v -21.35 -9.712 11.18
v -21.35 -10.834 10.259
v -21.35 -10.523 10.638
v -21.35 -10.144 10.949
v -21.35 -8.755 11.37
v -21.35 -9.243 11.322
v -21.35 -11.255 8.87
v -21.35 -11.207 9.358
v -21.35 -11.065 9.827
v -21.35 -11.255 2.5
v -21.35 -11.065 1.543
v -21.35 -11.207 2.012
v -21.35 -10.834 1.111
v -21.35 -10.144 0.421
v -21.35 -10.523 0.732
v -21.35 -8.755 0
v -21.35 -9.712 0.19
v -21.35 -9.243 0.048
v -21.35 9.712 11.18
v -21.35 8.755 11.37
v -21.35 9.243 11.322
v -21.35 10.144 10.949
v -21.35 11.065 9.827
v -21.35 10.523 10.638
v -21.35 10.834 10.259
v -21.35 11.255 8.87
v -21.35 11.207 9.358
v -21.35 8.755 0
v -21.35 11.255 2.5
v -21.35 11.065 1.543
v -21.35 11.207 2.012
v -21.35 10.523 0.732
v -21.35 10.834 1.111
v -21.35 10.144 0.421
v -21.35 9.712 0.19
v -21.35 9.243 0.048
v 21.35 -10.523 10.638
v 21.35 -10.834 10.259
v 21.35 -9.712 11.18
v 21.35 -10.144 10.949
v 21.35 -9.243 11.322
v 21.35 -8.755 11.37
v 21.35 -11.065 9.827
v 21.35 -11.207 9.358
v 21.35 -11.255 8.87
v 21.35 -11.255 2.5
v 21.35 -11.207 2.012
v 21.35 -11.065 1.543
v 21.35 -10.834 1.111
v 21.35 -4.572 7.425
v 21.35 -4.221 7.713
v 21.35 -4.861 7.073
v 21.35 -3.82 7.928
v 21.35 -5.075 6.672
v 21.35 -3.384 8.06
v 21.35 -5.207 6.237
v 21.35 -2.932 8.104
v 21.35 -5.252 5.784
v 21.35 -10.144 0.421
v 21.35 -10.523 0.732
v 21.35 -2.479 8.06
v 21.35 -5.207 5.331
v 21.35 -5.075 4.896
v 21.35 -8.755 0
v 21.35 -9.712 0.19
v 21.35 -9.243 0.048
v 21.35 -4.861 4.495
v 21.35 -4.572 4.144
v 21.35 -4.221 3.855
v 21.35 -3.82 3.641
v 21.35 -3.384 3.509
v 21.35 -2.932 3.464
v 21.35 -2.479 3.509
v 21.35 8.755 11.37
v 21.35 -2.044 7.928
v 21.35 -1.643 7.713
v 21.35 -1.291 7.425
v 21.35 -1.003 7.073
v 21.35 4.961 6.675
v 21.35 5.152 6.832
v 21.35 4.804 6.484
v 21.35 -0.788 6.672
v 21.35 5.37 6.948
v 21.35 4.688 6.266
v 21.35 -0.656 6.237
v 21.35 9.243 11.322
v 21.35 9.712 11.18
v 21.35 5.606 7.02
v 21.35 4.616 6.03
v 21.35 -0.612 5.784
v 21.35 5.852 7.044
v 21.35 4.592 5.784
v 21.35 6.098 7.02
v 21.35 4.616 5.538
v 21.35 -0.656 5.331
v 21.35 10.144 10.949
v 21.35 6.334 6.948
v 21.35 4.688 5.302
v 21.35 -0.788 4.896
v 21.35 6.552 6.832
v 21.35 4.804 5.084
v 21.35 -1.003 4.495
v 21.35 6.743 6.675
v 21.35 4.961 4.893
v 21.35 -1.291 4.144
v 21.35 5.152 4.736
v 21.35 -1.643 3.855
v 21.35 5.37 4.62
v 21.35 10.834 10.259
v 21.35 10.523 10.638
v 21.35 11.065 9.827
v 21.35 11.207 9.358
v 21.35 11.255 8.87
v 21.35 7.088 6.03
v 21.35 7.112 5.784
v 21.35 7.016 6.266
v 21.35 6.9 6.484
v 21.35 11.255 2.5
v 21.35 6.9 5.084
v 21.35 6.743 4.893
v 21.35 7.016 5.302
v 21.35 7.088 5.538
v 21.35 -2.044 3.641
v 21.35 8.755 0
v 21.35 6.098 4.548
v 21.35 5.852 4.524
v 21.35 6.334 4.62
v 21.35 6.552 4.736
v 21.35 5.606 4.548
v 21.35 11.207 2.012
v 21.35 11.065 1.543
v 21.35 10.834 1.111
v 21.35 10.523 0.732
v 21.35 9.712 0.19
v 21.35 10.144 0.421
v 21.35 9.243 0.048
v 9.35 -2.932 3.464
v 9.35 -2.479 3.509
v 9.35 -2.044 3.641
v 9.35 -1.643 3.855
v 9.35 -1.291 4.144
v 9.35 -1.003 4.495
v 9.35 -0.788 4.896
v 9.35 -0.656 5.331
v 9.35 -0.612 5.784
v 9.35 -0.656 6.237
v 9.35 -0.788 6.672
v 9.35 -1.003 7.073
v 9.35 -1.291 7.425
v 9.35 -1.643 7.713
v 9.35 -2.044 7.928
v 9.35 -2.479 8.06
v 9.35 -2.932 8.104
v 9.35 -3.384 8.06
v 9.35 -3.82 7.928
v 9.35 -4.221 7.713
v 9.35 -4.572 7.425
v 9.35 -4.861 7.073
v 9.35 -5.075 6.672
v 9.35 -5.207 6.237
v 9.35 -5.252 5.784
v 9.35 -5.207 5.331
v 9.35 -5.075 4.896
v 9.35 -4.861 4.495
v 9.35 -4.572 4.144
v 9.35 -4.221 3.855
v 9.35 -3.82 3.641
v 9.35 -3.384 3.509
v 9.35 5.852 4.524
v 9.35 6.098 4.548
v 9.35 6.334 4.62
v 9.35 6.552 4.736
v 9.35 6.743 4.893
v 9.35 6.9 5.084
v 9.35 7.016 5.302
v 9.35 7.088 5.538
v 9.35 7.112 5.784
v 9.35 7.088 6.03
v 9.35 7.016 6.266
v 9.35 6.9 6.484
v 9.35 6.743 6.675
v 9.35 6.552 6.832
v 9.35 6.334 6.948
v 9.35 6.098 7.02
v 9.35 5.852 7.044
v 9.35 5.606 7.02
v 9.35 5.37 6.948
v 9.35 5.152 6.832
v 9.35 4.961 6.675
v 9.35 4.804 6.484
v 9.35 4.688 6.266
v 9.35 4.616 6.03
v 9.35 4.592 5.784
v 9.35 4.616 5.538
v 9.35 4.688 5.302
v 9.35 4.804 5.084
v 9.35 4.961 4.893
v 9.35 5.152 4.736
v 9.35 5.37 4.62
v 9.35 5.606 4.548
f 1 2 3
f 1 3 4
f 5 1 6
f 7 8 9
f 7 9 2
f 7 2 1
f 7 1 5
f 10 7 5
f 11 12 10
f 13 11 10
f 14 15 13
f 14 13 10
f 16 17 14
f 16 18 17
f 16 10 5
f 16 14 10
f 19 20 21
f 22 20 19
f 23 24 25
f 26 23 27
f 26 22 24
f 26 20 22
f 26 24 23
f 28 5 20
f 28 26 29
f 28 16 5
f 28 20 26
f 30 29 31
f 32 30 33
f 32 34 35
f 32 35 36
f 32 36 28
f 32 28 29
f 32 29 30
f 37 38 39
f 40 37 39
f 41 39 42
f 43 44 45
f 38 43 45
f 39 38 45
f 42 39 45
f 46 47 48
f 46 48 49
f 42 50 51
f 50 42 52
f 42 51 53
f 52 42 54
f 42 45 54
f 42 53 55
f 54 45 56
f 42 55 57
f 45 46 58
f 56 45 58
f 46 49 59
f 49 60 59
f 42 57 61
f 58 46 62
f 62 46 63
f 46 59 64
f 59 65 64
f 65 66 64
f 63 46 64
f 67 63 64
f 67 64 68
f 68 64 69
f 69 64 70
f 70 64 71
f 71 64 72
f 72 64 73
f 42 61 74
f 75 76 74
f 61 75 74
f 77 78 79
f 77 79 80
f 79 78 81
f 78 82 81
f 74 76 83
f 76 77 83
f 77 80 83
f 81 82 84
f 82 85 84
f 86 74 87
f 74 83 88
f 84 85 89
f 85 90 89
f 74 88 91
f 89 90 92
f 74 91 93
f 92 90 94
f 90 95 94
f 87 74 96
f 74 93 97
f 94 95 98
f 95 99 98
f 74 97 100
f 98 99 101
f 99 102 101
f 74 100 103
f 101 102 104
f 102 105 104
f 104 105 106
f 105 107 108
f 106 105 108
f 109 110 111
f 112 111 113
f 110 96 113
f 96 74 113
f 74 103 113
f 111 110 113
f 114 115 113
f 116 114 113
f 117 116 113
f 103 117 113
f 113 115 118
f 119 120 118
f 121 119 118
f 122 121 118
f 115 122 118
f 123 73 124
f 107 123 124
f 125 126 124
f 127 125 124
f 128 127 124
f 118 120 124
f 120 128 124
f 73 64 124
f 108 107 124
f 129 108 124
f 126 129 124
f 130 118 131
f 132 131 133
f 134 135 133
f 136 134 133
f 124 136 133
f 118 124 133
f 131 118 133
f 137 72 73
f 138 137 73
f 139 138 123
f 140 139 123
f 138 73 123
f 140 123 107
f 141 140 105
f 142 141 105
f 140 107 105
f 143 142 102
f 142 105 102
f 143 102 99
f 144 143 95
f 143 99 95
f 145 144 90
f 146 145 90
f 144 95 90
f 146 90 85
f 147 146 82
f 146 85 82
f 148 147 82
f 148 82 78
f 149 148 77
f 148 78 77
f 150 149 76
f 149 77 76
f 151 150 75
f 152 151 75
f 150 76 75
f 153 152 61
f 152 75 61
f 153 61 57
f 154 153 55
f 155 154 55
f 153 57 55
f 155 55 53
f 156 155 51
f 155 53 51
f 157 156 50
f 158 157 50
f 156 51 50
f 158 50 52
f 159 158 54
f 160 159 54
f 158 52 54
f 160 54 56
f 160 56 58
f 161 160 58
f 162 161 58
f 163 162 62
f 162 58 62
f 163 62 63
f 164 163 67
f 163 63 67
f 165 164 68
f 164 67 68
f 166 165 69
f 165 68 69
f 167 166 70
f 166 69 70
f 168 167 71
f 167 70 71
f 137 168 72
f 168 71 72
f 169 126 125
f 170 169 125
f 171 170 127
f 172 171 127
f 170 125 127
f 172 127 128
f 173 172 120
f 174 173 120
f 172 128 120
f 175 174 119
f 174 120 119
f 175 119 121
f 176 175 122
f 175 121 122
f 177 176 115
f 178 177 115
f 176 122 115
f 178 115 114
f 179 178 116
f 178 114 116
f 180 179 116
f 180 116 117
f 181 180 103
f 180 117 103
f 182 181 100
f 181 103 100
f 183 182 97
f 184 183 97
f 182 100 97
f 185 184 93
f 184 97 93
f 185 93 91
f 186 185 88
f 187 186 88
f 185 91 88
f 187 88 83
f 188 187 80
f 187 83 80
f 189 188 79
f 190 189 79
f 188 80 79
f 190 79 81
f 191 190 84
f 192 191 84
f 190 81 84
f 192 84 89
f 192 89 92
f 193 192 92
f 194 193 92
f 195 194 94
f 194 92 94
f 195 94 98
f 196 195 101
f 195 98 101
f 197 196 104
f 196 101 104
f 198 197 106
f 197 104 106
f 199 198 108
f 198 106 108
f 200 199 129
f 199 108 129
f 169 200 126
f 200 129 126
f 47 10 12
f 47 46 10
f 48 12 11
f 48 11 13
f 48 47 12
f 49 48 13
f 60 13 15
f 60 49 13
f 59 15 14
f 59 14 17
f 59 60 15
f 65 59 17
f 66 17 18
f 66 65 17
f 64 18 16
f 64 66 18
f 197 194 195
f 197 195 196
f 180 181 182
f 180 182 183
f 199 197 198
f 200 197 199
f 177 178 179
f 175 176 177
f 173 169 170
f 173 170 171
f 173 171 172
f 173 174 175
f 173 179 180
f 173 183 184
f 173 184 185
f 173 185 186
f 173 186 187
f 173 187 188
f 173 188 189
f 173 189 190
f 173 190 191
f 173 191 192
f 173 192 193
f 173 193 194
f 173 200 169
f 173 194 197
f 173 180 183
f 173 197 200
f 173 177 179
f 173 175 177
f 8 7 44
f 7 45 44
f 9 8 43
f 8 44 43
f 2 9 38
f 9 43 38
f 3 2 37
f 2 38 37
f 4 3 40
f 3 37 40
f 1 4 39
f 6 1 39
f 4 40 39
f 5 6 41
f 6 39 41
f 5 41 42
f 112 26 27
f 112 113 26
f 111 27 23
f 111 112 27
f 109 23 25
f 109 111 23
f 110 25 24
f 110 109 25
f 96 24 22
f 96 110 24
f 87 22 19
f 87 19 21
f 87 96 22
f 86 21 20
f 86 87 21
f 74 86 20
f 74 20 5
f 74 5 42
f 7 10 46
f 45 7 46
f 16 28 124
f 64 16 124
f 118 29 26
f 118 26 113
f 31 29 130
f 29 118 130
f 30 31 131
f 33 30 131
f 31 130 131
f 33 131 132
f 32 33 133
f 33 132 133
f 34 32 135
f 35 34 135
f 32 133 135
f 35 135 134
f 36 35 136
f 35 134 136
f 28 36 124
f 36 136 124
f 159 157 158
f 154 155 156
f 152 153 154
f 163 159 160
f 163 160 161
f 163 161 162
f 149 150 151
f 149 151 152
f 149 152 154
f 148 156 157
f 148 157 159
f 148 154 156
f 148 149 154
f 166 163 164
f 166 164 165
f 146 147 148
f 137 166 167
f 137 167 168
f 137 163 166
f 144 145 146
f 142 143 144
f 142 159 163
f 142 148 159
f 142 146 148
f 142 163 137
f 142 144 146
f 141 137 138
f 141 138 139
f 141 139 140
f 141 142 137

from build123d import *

# Parameters (mm, degrees)
SKETCH1_W           = 42.7
SKETCH1_H           = 22.51
BOSS_EXTRUDE1_DEPTH = 11.37
FILLET1_R           = 2.5
SKETCH2_R           = 1.26
SKETCH2_R_2         = 2.32
CUT_EXTRUDE1_DEPTH  = 12


with BuildPart() as part:
    # Sketch1 → Boss-Extrude1 (new body)
    with BuildSketch(Plane.XY):
        Rectangle(SKETCH1_W, SKETCH1_H)
    extrude(amount=BOSS_EXTRUDE1_DEPTH)

    # Fillet1
    fillet1_edges = [part.edges().sort_by_distance(p)[0] for p in [
        (0, -11.255, 11.37),
        (0, -11.255, 0),
        (0, 11.255, 0),
        (0, 11.255, 11.37),
    ]]
    fillet(fillet1_edges, radius=FILLET1_R)

    # Sketch2 → Cut-Extrude1 (cut)
    with BuildSketch(Plane(origin=(21.35, 0, 0), x_dir=(0, 0, -1), z_dir=(1, 0, 0))):
        with Locations((-5.784105099, 5.852044752)):
            Circle(SKETCH2_R)
        with Locations((-5.784105099, -2.931681994)):
            Circle(SKETCH2_R_2)
    extrude(amount=-CUT_EXTRUDE1_DEPTH, mode=Mode.SUBTRACT)


solid = part.part
